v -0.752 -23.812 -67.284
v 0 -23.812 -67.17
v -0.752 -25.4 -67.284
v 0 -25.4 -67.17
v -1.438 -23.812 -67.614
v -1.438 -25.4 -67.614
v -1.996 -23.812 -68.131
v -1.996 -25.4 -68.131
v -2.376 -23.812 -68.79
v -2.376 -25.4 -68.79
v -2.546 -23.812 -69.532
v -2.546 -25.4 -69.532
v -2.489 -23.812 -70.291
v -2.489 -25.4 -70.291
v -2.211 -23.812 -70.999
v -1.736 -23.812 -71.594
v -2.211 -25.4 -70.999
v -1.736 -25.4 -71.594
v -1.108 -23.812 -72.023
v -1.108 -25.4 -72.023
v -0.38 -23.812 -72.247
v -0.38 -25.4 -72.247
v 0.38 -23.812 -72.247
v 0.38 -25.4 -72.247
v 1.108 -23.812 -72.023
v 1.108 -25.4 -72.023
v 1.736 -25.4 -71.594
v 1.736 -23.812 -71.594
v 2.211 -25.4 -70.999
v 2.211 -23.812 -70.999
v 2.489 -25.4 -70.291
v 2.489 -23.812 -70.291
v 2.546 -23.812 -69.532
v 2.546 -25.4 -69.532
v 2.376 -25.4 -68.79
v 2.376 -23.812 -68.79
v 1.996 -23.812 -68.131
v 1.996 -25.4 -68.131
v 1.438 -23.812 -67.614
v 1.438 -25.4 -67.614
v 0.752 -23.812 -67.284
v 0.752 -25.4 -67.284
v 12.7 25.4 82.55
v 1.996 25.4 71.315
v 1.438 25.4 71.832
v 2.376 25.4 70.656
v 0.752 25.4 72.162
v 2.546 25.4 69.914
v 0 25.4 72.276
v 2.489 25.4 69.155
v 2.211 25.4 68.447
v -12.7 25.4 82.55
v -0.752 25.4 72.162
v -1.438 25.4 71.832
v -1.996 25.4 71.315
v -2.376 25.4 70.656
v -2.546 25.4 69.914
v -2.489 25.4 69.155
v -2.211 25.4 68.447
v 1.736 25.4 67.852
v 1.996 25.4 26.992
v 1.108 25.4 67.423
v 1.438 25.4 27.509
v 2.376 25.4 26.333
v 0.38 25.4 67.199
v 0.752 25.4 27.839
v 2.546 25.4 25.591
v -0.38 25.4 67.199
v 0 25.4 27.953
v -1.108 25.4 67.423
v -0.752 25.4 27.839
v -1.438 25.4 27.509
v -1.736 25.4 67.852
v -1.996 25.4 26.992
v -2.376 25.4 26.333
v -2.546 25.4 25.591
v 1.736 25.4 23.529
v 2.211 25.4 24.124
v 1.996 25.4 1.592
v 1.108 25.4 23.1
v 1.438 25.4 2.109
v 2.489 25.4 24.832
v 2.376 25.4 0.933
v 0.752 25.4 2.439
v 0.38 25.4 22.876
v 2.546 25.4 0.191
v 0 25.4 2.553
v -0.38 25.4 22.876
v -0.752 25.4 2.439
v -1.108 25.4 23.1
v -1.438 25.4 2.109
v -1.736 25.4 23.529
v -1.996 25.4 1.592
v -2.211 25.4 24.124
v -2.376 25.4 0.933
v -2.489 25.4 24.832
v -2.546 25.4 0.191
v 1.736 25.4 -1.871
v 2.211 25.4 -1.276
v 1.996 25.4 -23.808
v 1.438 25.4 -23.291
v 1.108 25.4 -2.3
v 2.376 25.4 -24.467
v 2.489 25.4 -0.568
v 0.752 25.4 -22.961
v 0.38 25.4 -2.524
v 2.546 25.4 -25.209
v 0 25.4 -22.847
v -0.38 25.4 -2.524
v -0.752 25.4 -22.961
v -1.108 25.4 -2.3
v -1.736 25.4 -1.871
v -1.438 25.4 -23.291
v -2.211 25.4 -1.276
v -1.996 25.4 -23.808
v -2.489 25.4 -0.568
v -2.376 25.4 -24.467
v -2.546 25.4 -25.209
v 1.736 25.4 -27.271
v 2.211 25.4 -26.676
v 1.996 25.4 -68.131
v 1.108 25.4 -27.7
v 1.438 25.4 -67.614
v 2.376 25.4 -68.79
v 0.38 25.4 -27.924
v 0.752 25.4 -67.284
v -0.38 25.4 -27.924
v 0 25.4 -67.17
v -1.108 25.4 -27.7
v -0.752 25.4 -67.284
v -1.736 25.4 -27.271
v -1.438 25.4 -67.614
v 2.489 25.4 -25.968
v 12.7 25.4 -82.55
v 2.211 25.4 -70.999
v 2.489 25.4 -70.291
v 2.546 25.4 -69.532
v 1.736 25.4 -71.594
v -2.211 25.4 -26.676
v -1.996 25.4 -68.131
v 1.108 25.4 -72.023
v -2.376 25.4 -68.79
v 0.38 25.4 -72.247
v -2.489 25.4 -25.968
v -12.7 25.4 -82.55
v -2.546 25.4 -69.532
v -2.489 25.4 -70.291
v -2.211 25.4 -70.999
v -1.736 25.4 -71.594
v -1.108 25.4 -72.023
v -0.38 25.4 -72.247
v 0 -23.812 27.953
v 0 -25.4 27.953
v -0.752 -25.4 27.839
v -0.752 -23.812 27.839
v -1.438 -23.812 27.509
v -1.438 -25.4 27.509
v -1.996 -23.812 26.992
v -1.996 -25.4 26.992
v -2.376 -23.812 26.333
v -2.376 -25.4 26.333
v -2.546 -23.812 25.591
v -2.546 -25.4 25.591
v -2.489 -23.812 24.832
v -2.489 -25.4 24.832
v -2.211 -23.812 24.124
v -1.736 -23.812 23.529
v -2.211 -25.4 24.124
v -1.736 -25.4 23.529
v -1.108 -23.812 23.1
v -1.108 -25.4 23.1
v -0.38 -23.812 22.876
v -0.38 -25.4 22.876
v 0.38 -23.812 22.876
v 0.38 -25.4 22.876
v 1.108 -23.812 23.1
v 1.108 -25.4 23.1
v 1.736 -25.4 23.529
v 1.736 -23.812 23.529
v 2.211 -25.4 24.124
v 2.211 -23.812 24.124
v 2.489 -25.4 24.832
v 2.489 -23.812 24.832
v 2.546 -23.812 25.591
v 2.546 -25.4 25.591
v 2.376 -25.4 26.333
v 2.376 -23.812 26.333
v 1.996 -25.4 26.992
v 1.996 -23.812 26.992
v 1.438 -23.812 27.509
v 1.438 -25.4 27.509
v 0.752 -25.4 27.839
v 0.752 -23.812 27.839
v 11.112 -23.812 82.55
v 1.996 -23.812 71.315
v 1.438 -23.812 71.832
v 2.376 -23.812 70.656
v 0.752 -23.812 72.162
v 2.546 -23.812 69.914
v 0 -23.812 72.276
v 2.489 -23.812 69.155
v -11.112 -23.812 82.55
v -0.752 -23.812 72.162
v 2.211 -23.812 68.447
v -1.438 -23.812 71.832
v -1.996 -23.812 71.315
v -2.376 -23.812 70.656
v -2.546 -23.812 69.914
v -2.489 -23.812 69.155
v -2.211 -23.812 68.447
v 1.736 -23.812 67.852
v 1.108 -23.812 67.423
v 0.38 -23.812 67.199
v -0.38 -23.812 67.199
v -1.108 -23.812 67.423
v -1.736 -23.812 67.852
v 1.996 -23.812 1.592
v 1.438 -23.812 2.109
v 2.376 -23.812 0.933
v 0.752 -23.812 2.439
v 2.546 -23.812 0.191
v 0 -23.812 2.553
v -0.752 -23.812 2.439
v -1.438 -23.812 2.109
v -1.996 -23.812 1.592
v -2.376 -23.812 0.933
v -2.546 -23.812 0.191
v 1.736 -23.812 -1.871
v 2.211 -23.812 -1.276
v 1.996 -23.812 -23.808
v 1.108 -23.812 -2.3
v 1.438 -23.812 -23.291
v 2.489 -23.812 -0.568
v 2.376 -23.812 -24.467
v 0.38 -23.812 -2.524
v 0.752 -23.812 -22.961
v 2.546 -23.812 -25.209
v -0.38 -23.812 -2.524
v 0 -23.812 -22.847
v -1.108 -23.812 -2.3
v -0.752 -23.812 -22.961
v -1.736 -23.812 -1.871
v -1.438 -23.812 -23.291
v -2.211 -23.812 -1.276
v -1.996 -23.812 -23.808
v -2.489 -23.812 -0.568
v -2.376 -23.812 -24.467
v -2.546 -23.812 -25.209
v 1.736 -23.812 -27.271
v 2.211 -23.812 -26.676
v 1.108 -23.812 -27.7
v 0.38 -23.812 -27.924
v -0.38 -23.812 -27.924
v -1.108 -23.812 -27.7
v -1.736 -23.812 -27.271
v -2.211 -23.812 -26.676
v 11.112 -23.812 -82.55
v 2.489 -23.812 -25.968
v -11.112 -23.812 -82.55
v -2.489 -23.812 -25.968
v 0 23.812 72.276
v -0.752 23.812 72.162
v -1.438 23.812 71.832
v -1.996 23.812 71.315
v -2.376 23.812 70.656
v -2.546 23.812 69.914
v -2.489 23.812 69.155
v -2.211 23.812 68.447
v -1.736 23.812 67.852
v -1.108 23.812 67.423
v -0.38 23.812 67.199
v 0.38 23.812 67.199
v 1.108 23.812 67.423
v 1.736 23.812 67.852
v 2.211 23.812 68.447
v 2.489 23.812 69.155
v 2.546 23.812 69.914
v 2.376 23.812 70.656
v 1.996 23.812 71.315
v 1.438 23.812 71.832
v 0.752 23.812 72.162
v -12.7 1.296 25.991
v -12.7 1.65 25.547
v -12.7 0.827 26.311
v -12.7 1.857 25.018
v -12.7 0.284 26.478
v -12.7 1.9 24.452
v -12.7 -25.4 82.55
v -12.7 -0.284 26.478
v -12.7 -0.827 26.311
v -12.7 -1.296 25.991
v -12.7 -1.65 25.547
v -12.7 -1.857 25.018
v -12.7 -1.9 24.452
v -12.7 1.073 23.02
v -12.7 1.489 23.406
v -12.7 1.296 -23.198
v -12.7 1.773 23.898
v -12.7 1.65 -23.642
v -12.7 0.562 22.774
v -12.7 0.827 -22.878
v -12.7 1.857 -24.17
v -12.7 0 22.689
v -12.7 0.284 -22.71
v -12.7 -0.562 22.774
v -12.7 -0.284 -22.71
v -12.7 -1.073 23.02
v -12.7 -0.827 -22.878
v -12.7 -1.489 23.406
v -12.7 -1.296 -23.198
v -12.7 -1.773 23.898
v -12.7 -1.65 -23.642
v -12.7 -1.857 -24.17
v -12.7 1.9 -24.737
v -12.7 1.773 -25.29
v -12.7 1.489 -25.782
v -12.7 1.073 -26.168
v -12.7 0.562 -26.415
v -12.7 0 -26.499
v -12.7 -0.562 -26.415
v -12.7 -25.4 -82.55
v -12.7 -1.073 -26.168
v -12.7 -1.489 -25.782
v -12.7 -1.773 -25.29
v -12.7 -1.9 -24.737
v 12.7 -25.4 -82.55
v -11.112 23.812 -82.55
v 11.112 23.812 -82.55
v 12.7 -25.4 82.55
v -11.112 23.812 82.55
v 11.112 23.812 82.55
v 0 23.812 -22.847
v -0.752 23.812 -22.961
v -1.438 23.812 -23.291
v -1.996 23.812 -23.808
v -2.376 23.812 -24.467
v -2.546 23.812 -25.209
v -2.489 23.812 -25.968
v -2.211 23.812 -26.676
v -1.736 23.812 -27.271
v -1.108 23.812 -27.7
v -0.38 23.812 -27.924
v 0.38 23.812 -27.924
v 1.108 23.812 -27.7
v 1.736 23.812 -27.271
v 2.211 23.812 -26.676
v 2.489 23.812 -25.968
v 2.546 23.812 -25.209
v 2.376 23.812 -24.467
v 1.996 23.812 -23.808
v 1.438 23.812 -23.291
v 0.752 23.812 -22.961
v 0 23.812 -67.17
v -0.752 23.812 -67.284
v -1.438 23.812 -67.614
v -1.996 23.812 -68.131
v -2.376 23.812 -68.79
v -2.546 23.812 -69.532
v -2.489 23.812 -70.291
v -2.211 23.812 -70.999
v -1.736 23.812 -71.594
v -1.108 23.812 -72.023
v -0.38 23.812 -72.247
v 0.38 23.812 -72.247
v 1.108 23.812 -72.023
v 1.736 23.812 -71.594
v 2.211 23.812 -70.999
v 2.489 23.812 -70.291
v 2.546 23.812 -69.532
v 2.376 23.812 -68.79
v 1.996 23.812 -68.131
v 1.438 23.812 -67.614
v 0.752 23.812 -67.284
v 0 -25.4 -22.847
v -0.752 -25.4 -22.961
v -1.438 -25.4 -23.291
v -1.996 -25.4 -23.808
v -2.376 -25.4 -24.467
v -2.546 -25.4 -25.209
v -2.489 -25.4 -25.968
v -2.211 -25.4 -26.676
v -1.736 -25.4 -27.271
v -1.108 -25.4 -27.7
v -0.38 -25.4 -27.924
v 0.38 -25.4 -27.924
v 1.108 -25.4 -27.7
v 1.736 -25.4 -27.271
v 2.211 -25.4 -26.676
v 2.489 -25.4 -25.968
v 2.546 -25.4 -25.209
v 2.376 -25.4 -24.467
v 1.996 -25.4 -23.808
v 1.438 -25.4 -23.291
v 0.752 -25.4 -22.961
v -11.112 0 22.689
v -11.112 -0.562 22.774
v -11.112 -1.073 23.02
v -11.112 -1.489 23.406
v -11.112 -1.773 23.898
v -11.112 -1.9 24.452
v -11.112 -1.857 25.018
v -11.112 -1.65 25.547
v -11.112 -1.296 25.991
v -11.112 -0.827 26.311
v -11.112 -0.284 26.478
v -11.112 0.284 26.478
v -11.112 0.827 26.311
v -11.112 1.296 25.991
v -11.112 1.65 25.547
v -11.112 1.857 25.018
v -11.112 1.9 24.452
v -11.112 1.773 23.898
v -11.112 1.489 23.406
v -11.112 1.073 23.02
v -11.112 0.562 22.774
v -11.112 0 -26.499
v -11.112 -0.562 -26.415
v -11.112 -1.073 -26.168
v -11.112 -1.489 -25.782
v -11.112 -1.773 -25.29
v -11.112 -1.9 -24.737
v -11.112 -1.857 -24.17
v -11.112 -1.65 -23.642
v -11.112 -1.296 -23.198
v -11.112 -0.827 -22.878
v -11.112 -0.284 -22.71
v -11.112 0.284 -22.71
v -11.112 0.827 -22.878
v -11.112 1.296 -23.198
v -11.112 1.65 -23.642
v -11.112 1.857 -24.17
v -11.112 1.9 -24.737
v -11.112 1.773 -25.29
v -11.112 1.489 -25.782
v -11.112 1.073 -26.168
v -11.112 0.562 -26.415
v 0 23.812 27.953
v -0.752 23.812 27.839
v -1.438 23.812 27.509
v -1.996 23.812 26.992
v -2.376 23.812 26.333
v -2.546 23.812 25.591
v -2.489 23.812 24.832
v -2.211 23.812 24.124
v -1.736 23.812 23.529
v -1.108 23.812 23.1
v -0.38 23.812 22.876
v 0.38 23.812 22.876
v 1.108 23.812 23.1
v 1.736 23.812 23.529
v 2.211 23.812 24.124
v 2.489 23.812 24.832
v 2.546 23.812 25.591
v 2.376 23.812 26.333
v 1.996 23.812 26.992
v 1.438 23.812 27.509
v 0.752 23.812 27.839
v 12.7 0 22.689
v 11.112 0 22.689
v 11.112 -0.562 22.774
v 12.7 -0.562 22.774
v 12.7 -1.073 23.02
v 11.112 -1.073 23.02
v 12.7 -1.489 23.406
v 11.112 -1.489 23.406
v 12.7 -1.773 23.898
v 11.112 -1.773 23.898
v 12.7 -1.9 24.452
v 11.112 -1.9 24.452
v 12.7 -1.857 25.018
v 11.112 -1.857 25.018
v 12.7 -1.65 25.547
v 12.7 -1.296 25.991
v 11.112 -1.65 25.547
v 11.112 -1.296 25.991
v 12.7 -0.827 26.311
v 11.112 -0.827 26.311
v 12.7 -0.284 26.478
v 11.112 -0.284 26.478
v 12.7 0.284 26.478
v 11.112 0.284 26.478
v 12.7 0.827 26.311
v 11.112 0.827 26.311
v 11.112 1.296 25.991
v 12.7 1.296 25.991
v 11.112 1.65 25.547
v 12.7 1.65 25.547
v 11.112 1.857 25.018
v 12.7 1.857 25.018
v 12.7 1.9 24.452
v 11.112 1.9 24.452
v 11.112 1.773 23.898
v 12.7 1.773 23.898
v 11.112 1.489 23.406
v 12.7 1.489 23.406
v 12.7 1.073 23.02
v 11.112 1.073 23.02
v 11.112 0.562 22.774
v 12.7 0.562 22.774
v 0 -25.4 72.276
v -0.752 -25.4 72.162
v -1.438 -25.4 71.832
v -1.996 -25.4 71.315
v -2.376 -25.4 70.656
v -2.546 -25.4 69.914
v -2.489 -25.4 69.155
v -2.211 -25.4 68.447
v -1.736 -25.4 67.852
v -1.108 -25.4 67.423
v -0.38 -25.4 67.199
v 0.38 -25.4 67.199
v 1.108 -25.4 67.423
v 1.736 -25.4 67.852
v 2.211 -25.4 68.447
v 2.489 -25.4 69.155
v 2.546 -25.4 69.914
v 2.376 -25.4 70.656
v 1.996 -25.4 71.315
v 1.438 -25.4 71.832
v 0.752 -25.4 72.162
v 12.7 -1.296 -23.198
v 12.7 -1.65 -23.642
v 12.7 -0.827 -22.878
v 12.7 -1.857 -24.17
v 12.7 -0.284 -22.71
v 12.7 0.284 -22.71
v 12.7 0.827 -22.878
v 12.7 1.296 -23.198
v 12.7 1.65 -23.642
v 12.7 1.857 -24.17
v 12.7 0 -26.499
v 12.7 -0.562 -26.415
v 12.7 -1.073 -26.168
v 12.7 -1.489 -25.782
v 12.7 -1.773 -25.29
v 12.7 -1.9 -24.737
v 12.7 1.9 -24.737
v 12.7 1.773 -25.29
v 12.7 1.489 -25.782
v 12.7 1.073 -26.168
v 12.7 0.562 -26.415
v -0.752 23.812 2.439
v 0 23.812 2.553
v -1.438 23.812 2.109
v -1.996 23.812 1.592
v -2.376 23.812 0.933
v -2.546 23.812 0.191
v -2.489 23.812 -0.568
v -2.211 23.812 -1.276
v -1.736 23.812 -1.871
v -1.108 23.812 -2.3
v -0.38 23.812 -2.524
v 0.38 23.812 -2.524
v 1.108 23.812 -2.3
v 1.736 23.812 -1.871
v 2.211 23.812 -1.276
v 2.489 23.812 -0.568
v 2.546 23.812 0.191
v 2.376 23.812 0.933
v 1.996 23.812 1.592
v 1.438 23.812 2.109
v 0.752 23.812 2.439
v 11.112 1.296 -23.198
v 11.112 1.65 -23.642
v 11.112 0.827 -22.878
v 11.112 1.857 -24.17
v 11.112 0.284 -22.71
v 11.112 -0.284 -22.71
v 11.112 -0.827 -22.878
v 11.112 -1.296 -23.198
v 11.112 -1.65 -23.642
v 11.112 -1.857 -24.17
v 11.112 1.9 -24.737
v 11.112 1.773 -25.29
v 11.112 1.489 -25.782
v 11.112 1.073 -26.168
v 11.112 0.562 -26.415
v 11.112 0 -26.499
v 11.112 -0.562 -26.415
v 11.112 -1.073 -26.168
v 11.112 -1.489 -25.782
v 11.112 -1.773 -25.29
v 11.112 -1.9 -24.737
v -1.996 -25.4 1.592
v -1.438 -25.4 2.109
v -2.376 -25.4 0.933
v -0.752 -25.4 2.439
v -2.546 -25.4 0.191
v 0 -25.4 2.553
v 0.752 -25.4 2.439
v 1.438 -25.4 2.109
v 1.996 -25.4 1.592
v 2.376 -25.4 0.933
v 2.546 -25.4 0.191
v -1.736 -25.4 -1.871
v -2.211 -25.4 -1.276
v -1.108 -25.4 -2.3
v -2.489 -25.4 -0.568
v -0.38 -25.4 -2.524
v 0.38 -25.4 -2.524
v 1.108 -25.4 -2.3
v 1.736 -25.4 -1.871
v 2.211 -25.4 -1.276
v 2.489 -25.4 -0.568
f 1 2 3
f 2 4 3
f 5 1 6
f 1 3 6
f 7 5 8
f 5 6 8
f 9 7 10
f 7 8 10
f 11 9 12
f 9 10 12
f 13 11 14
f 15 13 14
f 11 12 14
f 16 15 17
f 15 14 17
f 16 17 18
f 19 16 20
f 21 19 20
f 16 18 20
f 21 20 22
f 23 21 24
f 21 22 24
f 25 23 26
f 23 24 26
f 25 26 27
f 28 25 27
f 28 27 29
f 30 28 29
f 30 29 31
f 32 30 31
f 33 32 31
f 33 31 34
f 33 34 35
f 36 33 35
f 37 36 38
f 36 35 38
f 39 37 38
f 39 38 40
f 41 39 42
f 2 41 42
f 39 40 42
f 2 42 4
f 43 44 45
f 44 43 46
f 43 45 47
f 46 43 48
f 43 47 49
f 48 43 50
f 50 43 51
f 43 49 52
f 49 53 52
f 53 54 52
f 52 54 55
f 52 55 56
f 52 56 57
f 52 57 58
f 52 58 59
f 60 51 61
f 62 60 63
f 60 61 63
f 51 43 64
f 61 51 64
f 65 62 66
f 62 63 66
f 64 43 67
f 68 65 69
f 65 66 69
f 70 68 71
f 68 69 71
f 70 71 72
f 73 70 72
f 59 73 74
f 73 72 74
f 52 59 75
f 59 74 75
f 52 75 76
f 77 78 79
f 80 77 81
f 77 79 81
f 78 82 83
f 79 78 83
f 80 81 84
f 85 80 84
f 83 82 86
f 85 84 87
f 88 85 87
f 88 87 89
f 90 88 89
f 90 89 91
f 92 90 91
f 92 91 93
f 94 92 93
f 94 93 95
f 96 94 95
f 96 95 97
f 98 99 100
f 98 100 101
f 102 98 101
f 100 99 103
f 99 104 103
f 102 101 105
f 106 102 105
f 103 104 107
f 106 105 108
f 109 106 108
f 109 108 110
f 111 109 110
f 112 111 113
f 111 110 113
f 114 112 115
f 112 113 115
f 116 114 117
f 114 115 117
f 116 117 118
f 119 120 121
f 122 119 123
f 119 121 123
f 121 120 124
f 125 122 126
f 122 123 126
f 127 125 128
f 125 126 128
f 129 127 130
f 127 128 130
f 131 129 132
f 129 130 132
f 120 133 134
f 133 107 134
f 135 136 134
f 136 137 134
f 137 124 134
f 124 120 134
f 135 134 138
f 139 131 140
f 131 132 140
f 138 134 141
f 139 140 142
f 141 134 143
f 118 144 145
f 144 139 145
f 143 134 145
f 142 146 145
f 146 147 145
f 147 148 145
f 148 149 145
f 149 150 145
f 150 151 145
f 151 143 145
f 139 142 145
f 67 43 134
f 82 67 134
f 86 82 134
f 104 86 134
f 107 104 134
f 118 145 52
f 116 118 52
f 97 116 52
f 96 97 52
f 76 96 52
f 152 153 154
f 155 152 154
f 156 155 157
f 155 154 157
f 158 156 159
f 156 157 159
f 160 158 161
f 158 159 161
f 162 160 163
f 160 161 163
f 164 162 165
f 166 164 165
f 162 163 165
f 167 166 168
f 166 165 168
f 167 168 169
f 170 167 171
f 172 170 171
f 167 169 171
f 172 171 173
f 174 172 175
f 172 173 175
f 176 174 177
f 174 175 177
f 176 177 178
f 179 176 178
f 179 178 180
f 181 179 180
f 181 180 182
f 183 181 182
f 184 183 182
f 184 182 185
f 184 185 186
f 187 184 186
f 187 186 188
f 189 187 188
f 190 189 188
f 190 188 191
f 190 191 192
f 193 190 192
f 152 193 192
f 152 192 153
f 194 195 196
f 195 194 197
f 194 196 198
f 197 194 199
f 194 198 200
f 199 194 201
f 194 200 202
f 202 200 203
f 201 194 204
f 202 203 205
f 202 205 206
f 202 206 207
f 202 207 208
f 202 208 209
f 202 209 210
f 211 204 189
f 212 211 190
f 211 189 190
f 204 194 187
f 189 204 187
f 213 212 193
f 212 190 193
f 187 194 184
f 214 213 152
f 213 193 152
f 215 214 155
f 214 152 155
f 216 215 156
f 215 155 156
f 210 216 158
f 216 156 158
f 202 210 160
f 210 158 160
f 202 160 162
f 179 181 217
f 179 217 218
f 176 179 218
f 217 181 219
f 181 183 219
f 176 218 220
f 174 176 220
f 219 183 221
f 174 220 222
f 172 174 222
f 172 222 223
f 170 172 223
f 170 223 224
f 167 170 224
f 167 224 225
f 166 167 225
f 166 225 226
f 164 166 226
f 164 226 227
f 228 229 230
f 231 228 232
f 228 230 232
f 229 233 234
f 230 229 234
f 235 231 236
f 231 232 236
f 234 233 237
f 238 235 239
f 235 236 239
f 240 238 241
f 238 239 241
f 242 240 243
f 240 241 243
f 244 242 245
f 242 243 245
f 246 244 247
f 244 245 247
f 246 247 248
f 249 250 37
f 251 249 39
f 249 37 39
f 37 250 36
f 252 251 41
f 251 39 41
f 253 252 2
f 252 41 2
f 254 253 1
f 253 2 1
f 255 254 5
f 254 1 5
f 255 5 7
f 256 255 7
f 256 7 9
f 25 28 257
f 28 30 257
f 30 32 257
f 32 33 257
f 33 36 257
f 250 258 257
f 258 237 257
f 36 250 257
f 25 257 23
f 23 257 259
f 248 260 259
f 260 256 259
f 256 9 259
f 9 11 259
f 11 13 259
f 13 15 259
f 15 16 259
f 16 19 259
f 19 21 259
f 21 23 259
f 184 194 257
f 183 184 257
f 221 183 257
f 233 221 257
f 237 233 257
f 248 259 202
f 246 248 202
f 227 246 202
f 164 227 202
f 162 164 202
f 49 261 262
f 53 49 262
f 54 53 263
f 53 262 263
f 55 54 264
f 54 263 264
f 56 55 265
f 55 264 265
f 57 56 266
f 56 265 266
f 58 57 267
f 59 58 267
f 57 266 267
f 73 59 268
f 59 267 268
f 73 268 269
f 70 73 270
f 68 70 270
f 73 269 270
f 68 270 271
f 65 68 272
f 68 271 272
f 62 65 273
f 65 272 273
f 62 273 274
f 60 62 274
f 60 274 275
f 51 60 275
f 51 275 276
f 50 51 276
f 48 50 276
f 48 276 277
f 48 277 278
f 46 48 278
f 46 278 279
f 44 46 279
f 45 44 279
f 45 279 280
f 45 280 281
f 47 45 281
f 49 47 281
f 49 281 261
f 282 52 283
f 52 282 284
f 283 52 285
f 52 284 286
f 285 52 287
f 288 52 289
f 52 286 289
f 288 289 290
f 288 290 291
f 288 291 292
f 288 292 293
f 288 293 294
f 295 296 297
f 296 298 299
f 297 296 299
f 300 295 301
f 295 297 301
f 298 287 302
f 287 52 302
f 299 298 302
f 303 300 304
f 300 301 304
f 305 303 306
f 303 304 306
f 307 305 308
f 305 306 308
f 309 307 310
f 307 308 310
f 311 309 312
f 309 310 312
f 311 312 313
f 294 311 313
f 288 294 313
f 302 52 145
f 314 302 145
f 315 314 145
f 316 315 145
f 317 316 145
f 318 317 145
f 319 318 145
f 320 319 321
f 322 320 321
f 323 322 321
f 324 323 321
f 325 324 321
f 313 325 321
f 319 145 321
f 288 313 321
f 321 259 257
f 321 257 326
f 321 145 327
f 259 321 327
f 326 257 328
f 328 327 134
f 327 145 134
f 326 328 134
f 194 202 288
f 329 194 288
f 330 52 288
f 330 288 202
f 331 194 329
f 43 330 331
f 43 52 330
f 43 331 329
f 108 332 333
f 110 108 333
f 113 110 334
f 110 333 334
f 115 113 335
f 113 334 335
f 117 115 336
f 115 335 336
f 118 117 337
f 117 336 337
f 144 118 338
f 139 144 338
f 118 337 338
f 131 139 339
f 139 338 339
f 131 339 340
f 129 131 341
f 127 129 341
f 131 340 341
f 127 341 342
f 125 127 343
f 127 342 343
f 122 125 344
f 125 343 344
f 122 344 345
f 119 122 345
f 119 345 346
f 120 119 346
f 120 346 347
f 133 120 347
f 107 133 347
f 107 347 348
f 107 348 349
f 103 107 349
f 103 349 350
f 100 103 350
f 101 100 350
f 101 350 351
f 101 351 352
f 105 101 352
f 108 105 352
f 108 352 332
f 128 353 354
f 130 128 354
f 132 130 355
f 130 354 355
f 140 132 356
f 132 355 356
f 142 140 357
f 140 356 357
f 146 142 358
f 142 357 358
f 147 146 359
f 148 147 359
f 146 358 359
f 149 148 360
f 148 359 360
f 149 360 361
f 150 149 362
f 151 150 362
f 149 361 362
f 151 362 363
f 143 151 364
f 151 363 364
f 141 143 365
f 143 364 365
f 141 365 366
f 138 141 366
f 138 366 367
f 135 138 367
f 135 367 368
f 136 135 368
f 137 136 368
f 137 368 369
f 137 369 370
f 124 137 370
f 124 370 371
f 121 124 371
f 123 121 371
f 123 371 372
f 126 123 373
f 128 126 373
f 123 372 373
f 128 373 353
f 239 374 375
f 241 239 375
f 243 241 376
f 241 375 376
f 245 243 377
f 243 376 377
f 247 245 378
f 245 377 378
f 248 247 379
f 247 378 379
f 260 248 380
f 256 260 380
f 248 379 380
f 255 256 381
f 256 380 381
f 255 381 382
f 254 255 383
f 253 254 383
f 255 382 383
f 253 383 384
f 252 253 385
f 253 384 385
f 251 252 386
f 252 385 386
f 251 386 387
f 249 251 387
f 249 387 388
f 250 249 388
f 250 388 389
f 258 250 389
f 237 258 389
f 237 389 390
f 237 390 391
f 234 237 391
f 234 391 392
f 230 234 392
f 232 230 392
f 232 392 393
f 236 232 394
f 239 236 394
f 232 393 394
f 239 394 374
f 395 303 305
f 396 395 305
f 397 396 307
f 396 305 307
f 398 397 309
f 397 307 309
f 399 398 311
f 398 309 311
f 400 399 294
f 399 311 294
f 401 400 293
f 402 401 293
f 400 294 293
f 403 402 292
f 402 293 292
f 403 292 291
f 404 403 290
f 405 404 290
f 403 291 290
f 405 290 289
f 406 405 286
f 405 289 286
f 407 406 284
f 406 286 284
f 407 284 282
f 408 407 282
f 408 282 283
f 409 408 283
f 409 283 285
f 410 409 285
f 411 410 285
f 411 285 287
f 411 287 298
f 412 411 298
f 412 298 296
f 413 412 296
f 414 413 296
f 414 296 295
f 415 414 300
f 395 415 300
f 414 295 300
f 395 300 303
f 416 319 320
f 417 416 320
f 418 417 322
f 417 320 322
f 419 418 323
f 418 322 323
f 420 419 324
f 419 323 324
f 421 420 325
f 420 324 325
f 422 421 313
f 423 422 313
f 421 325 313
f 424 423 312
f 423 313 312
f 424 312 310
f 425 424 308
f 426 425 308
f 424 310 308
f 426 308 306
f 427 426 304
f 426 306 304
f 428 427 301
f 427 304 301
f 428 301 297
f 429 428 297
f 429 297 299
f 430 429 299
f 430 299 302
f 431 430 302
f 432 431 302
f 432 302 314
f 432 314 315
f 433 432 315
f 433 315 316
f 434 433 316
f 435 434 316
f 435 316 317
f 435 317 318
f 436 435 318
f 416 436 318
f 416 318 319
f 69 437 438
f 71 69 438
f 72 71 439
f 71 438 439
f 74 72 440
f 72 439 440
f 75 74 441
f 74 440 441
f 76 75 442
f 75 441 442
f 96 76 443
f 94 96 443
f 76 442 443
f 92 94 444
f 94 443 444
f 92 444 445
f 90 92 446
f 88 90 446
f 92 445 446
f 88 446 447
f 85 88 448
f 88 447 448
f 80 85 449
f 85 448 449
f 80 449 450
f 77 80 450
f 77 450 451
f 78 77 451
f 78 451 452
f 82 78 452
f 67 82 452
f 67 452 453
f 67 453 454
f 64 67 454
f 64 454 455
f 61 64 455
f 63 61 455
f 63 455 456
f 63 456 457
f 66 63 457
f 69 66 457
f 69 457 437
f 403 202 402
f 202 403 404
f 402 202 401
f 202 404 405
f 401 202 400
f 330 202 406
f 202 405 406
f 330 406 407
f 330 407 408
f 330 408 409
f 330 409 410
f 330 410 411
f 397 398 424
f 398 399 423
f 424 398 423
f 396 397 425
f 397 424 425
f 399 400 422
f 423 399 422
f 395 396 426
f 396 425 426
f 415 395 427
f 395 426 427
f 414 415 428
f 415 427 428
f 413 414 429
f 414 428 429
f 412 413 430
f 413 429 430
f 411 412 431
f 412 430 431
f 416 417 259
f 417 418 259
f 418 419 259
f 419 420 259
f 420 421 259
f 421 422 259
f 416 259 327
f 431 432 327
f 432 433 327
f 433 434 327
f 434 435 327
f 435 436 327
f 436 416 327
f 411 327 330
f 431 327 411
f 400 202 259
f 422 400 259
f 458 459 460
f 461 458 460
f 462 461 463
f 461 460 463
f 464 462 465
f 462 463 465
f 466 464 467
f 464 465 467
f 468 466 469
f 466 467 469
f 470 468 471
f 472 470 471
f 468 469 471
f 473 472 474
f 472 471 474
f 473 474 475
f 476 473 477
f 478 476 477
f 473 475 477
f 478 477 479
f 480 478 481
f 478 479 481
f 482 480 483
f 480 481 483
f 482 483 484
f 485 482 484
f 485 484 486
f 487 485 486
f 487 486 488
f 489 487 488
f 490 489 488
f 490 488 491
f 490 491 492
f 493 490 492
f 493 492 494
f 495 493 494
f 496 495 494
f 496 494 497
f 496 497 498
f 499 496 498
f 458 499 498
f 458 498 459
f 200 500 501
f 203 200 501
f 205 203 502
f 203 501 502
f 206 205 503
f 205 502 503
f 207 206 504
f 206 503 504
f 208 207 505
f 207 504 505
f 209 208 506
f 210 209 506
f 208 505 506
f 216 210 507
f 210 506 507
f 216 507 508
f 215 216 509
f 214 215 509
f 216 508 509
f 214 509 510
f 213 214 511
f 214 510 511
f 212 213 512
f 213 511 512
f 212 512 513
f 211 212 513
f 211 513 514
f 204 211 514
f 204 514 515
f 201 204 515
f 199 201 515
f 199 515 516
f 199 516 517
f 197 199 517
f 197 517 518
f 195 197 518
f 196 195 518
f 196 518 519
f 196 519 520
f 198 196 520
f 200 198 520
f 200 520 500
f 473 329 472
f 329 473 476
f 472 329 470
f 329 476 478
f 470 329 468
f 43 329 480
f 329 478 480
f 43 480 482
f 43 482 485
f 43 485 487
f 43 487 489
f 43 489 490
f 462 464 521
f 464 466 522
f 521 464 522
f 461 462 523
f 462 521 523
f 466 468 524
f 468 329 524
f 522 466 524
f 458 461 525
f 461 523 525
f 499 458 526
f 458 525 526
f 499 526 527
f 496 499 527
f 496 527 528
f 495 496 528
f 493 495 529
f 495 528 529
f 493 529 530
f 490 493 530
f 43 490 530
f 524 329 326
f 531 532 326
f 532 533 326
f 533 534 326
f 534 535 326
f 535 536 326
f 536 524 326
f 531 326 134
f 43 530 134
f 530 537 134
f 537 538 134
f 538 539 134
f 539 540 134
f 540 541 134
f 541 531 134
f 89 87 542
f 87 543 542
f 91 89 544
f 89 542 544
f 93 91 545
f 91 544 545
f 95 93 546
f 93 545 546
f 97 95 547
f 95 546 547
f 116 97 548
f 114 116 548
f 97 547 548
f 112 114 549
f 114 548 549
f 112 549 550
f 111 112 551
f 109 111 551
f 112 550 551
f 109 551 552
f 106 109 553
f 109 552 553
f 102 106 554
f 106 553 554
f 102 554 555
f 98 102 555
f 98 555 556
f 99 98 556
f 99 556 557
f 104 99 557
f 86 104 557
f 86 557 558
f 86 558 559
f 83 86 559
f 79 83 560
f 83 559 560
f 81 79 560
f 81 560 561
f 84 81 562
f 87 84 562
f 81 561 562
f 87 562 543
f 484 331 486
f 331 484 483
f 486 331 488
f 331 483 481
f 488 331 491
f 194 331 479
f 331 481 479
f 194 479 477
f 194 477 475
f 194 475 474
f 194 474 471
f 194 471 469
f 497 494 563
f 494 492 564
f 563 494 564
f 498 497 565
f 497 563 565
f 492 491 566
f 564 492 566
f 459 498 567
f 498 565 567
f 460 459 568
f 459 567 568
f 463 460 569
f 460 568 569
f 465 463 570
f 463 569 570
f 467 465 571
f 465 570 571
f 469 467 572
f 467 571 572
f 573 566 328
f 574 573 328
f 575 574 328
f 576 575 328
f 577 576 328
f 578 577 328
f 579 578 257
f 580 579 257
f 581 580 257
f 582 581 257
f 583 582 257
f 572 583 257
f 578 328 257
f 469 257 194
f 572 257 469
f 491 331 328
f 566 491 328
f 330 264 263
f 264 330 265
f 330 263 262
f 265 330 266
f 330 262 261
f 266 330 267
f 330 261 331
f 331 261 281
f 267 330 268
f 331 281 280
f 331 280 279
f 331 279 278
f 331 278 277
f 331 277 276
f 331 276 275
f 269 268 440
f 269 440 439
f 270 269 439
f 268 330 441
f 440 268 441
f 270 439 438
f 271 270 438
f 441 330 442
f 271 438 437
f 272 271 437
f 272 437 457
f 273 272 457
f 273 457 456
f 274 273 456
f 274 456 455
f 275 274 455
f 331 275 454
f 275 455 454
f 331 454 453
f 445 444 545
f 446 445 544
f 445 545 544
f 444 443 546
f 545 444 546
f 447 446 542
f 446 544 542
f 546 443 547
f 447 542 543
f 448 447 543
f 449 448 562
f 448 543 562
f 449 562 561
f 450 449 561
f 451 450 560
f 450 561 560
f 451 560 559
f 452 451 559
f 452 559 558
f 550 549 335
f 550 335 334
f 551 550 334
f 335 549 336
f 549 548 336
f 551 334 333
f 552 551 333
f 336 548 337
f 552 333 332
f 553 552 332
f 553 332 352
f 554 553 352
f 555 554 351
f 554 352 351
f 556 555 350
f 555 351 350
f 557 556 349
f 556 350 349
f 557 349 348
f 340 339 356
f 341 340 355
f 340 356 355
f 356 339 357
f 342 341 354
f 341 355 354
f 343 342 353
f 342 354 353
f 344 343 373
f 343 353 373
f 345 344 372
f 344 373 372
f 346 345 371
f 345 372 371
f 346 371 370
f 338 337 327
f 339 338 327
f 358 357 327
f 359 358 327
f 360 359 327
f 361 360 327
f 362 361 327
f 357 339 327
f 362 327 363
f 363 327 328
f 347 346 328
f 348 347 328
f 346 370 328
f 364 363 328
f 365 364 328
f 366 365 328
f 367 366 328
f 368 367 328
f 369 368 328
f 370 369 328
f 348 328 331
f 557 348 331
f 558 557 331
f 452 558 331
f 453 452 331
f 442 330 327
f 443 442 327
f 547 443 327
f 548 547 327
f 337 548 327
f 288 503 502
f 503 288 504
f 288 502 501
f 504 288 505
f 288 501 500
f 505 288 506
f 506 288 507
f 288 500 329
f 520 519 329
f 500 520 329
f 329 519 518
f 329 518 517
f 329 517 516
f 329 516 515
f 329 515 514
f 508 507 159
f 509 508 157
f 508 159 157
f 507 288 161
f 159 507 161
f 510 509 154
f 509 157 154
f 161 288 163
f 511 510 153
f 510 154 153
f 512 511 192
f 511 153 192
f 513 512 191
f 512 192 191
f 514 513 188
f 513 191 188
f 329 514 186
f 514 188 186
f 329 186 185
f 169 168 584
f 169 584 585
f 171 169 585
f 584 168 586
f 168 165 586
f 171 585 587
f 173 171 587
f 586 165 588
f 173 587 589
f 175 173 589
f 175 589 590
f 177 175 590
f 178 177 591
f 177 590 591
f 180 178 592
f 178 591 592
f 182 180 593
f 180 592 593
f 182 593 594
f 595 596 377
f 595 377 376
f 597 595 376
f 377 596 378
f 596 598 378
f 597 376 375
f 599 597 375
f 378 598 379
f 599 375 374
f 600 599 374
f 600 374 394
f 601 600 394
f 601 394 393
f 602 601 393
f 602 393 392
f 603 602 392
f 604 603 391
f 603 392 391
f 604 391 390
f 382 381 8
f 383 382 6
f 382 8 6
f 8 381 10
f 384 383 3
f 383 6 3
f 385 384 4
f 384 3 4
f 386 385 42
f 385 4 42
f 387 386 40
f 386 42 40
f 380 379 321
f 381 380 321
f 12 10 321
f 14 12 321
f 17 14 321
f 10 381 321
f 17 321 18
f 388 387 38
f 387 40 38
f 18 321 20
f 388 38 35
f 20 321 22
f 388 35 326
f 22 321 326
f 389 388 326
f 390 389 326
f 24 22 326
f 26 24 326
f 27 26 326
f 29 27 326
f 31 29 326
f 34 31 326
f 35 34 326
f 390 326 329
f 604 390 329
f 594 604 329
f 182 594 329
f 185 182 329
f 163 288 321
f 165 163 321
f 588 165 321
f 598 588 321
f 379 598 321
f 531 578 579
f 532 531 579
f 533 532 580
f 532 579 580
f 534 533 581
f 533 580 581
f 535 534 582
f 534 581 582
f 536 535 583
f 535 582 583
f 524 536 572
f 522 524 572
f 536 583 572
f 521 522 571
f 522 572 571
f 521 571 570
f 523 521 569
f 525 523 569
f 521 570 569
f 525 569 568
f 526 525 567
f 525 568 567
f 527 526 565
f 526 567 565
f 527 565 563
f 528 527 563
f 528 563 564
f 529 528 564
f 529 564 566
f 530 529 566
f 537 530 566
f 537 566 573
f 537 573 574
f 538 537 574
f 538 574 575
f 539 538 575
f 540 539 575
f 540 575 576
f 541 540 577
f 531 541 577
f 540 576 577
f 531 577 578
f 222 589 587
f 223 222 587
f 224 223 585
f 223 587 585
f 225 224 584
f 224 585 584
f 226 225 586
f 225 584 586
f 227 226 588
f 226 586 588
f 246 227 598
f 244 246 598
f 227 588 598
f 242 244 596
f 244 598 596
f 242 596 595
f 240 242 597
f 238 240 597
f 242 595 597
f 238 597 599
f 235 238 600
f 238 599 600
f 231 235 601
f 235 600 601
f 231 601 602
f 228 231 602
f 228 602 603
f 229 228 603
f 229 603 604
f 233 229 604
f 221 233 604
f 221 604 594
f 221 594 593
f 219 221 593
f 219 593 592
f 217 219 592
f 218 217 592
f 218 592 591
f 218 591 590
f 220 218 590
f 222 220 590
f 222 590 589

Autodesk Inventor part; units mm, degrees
ref_plane "YZ Plane" through (0, 0, 0) normal (1, 0, 0) x (0, 1, 0)
ref_plane "XZ Plane" through (0, 0, 0) normal (0, 1, 0) x (-1, 0, 0)
ref_plane "XY Plane" through (0, 0, 0) normal (0, 0, 1) x (1, 0, 0)
sketch "Sketch1" plane through (0, 0, 0) normal (0, 0, 1) x (1, 0, 0)
  line L0 (-12.7, -25.4) -> (12.7, -25.4)
  line L1 (12.7, -25.4) -> (12.7, 25.4)
  line L2 (12.7, 25.4) -> (-12.7, 25.4)
  line L3 (-12.7, 25.4) -> (-12.7, -25.4)
  line L4 (-12.7, -25.4) -> (12.7, 25.4) construction
  line L5 (12.7, -25.4) -> (-12.7, 25.4) construction
  line L6 (-11.1125, 23.8125) -> (11.1125, 23.8125)
  line L7 (11.1125, 23.8125) -> (11.1125, -23.8125)
  line L8 (11.1125, -23.8125) -> (-11.1125, -23.8125)
  line L9 (-11.1125, -23.8125) -> (-11.1125, 23.8125)
  point P0 (0, 0)
  dimension "width" = 25.4
  dimension "height" = 50.8
  dimension "thickness" = 1.5875
extrude "Extrusion1" add sketch "Sketch1" along normal mid plane 165.1
sketch "Sketch5" plane through (-12.7, 25.4, 82.55) normal (0, 1, 0) x (1, 0, 0)
  point P0 (12.7, 82.55)
  point P1 (12.7, 82.55)
  point P2 (12.7, 107.95)
  point P3 (12.7, 57.15)
  dimension "d28" = 25.4
  dimension "d29" = 25.4
hole "Hole3" at (0, 25.4, 0) at (0, 25.4, -25.4) at (0, 25.4, 25.4) direction (0, -1, 0) diameter 5.1054 end through all clearance for "Flat Head Machine Screw (82)" size "#10" standard "Ansi Unified Screw Threads"
sketch "Sketch6" plane through (-12.7, 25.4, 82.55) normal (0, 1, 0) x (1, 0, 0)
  line L0 (12.7, 152.273) -> (12.7, 12.827) construction
  line L1 (0, 165.1) -> (25.4, 165.1) construction
  point P0 (12.7, 82.55)
  point P1 (12.7, 82.55)
  point P2 (12.7, 165.1)
  dimension "d37" = 139.446
hole "Hole4" at (0, 25.4, -69.723) at (0, 25.4, 69.723) direction (0, -1, 0) diameter 5.1054 end through all clearance for "Flat Head Machine Screw (82)" size "#10" standard "Ansi Unified Screw Threads"
sketch "Sketch7" plane through (12.7, -25.4, 82.55) normal (1, 0, 0) x (0, 0, -1)
  line L0 (57.9558, 25.4) -> (107.1442, 25.4) construction
  point P0 (82.55, 25.4)
  point P1 (82.55, 25.4)
  dimension "d45" = 49.1884
hole "Hole5" at (12.7, 0, 24.5942) at (12.7, 0, -24.5942) direction (-1, 0, 0) diameter 3.81 end through all clearance for "Flat Head Machine Screw (82)" size "#6" standard "Ansi Unified Screw Threads"
equation "\"d29\" = d28"
properties part number "EL2-C-001" material "Aluminum 6061"
